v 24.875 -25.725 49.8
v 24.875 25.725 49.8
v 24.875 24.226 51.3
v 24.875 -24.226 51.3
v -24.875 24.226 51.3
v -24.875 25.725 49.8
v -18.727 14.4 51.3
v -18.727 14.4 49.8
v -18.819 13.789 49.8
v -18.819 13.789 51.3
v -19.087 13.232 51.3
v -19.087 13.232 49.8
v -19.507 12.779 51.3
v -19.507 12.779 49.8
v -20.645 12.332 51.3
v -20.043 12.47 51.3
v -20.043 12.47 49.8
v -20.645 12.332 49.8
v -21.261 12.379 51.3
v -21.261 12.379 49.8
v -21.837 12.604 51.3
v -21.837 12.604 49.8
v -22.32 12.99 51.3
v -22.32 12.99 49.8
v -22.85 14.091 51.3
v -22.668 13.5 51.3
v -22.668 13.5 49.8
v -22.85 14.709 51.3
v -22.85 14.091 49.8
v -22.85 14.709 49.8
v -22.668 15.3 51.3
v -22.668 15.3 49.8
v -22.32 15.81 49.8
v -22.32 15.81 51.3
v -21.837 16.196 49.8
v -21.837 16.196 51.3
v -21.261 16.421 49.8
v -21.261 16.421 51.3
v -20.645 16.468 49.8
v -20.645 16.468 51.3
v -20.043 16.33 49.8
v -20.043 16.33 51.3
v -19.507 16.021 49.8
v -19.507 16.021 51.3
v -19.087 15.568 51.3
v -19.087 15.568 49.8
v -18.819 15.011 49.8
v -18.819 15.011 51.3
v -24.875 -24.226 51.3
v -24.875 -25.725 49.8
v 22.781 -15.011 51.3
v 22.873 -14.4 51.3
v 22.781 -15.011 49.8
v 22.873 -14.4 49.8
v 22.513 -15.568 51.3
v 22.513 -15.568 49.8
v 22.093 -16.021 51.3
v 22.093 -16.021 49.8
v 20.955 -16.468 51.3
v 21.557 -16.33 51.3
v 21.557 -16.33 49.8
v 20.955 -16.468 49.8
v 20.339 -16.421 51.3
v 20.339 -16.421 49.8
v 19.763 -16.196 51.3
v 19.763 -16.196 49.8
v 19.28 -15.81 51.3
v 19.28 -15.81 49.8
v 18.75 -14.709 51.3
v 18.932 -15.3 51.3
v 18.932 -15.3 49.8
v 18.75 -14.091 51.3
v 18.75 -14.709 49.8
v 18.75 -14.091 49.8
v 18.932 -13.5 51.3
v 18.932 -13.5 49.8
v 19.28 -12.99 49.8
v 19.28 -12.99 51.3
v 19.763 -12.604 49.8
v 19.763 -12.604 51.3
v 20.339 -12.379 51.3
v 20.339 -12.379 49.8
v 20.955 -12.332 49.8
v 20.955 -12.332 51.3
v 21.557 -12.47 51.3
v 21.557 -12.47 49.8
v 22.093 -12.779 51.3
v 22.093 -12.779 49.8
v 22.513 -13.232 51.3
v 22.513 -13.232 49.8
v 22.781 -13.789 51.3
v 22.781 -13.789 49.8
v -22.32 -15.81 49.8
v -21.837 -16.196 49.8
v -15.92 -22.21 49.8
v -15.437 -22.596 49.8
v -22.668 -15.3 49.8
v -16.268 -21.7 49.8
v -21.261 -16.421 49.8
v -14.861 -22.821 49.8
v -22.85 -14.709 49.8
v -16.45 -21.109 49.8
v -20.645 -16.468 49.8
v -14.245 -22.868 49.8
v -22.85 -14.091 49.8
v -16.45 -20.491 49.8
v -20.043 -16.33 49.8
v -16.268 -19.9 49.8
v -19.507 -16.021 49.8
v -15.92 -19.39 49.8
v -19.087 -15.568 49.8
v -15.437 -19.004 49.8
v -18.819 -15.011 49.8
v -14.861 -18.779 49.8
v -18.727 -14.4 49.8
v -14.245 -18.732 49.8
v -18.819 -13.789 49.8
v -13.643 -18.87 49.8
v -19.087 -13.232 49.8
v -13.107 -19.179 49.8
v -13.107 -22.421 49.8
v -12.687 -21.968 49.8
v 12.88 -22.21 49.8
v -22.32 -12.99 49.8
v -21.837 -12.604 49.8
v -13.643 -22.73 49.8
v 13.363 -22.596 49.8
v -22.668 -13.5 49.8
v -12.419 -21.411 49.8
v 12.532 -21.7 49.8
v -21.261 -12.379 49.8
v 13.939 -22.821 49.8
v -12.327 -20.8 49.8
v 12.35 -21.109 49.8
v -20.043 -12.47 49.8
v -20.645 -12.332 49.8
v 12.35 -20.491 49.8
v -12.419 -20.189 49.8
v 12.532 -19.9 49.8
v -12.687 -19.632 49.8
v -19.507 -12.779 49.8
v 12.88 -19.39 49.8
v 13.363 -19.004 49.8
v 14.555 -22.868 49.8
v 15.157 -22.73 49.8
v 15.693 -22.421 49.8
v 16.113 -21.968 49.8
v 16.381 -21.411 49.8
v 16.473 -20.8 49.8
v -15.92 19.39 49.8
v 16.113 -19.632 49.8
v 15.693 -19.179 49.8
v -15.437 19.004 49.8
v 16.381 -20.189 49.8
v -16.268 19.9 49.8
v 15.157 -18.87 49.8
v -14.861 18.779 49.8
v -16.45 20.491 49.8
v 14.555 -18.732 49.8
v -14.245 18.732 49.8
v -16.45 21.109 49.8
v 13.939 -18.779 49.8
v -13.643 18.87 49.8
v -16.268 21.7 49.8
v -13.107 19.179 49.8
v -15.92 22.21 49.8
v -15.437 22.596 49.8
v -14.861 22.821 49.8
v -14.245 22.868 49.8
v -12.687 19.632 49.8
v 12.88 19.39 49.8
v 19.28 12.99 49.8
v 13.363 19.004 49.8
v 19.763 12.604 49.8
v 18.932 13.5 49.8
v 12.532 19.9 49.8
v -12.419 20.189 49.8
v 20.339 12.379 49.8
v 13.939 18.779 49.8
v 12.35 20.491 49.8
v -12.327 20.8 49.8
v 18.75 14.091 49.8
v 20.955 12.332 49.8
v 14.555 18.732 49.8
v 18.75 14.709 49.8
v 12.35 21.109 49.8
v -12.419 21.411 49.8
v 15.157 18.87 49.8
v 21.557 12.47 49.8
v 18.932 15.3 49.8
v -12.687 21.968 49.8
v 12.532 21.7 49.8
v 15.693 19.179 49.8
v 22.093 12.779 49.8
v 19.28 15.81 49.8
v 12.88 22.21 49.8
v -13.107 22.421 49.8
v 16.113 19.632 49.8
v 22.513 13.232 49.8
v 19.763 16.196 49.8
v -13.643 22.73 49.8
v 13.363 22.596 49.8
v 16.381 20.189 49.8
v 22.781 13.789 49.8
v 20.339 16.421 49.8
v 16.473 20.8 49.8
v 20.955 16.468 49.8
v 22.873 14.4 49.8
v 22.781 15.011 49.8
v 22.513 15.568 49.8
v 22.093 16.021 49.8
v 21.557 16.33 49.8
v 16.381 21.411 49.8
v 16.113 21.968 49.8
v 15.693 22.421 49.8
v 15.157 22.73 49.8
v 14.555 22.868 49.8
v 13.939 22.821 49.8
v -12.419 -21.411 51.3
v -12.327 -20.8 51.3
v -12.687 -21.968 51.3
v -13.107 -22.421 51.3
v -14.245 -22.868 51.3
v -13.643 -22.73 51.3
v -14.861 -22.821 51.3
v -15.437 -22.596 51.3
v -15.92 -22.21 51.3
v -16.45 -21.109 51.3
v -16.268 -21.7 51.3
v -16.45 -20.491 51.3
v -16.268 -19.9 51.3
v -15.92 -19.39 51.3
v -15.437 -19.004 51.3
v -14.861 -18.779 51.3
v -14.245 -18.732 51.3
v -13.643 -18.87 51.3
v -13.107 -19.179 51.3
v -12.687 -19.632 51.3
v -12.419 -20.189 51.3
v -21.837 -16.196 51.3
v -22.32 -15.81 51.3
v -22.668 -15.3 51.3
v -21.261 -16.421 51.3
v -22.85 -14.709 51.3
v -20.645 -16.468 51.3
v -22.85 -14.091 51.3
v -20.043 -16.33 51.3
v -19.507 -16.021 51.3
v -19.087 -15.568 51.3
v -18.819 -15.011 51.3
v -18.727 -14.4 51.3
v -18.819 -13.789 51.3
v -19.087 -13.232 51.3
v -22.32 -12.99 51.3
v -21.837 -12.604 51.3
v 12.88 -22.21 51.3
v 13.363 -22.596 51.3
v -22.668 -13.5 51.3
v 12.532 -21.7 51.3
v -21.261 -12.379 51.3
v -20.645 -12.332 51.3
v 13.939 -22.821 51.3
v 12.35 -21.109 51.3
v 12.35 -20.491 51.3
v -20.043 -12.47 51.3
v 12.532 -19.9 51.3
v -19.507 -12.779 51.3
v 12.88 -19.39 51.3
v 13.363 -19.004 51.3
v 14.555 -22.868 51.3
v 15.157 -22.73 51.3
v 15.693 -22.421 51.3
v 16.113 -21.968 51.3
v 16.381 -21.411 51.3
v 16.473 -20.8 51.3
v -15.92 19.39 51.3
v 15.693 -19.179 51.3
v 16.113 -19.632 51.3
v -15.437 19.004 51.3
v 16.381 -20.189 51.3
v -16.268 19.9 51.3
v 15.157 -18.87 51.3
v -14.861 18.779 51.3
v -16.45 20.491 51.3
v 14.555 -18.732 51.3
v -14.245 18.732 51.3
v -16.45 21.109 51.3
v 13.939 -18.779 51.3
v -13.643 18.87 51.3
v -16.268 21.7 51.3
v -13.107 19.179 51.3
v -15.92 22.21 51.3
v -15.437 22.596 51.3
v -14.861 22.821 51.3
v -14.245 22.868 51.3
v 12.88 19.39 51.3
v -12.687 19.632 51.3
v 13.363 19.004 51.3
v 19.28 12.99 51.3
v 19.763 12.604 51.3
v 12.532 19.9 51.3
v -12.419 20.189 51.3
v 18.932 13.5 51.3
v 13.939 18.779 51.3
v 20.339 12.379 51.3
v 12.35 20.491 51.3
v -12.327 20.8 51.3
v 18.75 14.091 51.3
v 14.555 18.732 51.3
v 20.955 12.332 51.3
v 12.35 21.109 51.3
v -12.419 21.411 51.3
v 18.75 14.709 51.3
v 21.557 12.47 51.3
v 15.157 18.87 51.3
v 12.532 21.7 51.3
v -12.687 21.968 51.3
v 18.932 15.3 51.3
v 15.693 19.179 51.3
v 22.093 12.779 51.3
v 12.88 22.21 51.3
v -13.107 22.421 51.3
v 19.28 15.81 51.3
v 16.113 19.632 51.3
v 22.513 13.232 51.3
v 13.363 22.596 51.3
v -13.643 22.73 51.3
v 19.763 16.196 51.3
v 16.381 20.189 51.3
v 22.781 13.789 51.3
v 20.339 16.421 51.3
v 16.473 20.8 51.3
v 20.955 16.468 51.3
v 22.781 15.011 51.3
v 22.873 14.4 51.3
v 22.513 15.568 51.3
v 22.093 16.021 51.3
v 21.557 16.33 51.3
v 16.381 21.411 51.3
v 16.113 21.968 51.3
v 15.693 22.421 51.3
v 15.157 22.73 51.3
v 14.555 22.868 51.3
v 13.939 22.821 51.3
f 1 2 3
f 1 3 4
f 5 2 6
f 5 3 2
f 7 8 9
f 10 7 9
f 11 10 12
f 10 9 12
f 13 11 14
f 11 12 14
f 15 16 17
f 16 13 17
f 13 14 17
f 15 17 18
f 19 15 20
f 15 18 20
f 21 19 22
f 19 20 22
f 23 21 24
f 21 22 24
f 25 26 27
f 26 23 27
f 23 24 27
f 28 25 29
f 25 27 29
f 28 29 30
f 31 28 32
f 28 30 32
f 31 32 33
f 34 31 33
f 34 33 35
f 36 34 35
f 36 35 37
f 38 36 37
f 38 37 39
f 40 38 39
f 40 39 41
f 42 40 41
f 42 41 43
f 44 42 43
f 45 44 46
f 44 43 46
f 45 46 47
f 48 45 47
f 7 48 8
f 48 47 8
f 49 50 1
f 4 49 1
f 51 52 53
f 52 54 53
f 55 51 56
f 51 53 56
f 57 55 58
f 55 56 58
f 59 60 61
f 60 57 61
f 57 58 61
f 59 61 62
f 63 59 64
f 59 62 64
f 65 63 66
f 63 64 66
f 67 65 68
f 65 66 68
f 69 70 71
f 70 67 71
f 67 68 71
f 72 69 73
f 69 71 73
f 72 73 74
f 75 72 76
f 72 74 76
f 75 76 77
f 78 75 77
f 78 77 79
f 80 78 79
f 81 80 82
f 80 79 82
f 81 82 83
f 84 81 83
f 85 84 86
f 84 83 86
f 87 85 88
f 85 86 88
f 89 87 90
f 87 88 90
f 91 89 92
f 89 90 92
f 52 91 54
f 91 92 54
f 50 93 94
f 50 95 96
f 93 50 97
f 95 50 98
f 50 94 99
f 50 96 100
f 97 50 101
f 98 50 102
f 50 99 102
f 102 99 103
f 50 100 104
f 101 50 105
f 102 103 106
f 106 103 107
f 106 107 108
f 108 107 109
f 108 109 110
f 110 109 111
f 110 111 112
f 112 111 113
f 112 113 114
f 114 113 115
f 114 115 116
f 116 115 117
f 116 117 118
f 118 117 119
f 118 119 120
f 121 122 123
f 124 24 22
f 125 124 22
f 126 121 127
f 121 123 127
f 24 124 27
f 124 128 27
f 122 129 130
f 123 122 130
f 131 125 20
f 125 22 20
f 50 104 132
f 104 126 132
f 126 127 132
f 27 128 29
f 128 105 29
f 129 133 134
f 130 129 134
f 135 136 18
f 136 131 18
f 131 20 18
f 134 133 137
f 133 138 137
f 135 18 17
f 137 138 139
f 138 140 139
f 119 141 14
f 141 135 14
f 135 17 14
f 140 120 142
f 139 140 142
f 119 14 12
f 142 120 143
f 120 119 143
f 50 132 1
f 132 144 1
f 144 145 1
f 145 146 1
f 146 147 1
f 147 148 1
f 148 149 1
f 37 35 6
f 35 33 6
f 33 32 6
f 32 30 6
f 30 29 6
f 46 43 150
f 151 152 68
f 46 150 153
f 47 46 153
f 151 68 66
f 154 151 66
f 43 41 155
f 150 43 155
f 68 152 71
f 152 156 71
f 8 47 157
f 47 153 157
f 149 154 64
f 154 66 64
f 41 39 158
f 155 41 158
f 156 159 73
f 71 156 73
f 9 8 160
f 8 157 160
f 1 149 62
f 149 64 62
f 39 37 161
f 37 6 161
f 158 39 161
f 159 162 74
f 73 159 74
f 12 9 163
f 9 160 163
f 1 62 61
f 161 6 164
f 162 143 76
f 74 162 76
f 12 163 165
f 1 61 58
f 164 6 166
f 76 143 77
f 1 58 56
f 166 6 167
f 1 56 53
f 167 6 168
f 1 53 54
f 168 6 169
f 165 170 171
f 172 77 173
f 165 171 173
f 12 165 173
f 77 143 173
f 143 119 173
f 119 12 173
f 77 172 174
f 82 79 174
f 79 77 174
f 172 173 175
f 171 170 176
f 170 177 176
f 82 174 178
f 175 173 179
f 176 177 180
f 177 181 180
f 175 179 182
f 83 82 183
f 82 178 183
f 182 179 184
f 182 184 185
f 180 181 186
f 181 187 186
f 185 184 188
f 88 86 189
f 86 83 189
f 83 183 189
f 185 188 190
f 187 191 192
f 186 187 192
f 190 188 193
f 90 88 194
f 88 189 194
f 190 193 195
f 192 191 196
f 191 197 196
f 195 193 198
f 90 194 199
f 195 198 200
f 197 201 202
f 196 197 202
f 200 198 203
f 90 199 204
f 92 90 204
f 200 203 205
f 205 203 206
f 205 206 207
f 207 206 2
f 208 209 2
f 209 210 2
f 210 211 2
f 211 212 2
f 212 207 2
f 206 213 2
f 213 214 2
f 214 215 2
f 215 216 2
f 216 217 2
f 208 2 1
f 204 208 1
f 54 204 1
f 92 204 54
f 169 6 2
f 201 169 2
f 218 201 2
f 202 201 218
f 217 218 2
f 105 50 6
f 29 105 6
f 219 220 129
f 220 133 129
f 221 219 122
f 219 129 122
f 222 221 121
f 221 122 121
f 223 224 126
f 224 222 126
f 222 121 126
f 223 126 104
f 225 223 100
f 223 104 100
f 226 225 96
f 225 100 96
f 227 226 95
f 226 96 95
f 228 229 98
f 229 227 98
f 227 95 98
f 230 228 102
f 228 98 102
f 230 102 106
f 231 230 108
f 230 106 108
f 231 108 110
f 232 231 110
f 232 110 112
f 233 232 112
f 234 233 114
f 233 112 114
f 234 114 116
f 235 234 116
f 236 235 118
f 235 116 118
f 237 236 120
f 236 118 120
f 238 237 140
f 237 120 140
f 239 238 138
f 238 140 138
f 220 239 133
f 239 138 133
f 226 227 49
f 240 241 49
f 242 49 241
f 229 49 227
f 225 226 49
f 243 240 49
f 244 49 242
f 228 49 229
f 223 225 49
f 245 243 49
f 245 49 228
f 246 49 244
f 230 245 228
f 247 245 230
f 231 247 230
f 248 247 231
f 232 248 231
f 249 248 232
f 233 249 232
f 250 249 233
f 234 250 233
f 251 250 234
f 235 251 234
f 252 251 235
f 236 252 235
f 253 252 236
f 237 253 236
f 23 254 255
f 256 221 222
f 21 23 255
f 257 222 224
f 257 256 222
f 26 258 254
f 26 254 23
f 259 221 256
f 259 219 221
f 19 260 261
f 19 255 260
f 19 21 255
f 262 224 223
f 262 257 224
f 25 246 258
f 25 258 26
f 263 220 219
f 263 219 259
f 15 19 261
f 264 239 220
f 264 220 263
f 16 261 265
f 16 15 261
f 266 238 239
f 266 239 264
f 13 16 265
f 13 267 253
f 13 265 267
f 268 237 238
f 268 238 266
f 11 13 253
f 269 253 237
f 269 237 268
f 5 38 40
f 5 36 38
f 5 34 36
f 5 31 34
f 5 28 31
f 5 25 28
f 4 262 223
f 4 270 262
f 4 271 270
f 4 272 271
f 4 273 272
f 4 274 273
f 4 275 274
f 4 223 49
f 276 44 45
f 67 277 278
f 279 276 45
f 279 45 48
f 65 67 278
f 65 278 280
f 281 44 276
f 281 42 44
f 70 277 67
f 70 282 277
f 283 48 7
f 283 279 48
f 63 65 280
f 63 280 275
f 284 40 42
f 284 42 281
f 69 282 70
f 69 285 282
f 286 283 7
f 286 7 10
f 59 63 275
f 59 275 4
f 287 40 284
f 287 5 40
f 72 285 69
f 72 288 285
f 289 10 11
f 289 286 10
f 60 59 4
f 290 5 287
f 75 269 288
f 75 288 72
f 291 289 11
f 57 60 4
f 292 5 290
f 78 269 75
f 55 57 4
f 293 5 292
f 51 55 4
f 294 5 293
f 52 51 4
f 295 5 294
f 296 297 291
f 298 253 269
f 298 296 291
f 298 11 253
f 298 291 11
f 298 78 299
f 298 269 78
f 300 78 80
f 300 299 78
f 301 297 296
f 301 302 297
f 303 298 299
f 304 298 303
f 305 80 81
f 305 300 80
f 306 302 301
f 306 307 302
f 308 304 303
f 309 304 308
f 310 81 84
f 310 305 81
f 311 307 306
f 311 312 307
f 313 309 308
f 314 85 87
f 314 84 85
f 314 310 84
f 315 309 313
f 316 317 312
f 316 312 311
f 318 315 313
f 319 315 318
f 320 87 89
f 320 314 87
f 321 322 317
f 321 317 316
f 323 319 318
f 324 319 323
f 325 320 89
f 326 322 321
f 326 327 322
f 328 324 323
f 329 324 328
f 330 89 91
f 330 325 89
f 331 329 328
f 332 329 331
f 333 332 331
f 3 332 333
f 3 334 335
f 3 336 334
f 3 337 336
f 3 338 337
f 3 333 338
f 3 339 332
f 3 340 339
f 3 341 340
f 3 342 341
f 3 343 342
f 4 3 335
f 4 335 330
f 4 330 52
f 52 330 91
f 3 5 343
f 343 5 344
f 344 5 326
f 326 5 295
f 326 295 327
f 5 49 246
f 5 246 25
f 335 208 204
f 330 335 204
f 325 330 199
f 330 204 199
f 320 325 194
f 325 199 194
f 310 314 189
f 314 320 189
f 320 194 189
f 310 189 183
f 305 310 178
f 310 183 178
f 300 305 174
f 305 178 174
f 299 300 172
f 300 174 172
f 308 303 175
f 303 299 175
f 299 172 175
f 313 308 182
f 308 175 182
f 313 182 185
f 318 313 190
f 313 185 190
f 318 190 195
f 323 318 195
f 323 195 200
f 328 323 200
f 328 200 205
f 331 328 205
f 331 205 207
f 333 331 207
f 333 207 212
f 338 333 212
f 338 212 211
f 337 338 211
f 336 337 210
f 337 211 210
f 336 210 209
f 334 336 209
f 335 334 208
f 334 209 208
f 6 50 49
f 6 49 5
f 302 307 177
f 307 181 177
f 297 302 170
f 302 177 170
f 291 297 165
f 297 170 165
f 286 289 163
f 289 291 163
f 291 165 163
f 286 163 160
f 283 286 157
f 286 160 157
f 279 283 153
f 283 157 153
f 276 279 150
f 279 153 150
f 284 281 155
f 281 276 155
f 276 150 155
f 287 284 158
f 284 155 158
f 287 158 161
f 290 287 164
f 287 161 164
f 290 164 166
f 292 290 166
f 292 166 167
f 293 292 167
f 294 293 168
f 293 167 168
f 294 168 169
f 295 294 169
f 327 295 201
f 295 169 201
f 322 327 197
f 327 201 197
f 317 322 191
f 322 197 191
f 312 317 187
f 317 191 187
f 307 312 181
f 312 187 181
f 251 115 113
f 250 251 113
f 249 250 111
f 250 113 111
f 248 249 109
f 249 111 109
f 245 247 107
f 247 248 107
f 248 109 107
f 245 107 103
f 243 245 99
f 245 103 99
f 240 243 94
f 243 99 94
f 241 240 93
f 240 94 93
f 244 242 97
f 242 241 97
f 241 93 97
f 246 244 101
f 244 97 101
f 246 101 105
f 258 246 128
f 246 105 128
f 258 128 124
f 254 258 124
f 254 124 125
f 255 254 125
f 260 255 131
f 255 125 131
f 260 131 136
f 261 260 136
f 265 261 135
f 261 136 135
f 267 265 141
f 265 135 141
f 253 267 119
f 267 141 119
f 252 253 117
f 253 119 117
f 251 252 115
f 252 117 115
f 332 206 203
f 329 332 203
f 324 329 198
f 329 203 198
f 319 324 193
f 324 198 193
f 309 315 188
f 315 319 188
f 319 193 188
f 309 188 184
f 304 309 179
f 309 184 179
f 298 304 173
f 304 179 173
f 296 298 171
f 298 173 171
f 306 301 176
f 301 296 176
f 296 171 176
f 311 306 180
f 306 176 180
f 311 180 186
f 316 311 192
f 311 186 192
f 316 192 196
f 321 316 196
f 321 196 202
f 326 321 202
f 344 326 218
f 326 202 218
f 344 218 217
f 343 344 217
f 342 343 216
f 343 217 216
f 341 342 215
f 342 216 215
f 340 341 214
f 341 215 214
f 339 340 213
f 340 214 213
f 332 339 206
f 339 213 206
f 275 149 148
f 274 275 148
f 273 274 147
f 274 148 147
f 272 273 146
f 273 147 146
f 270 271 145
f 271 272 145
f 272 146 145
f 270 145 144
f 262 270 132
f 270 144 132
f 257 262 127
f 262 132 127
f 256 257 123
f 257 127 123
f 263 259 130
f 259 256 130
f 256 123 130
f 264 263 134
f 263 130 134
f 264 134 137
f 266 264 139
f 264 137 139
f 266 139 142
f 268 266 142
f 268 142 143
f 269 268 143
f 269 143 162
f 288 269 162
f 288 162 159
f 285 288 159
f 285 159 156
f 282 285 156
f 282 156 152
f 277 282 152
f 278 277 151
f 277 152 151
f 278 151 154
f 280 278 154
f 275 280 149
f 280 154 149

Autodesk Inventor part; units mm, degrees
ref_plane "YZ Plane" through (0, 0, 0) normal (1, 0, 0) x (0, 1, 0)
ref_plane "XZ Plane" through (0, 0, 0) normal (0, 1, 0) x (-1, 0, 0)
sketch "Sketch1" plane through (0, 0, 0) normal (0, 0, 1) x (1, 0, 0)
  circle A0 centre (-21.9, -21.9) radius 1.875 projected
  circle A1 centre (21.9, 21.9) radius 1.875 projected
  circle A2 centre (21.9, -21.9) radius 1.875 projected
  circle A3 centre (-21.9, 21.9) radius 1.875 projected
  circle A4 centre (14.4, 20.8) radius 2.0734 projected
  circle A5 centre (-14.4, -20.8) radius 2.0734 projected
  circle A6 centre (14.4, -20.8) radius 2.0734 projected
  circle A7 centre (20.8, -14.4) radius 2.0734 projected
  line L0 (-17.05, 17.05) -> (-17.05, -17.05) projected
  line L1 (17.05, 17.05) -> (-17.05, 17.05) projected
  line L2 (17.05, -17.05) -> (17.05, 17.05) projected
  line L3 (-17.05, -17.05) -> (17.05, -17.05) projected
  circle A8 centre (20.8, 14.4) radius 2.0734 projected
  circle A9 centre (-14.4, 20.8) radius 2.0734 projected
  circle A10 centre (-20.8, -14.4) radius 2.0734 projected
  circle A11 centre (-20.8, 14.4) radius 2.0734 projected
  line L4 (-22.9, 24.875) -> (22.9, 24.875) projected
  arc A12 (-22.9, 24.875) -> (-24.875, 22.9) centre (-22.9, 22.9) ccw projected
  line L5 (-24.875, -22.9) -> (-24.875, 22.9) projected
  arc A13 (-24.875, -22.9) -> (-22.9, -24.875) centre (-22.9, -22.9) ccw projected
  line L6 (22.9, -24.875) -> (-22.9, -24.875) projected
  arc A14 (22.9, -24.875) -> (24.875, -22.9) centre (22.9, -22.9) ccw projected
  line L7 (24.875, 22.9) -> (24.875, -22.9) projected
  arc A15 (24.875, 22.9) -> (22.9, 24.875) centre (22.9, 22.9) ccw projected
  point P0 (0, 0)
ref_plane "Work Plane1" through (-24.15, -24.15, 49.8) normal (0, 0, 1) x (1, 0, 0)
extrude "Extrusion1" add sketch "Sketch1" along normal blind 1.5 from surface at 49.8 contours A0 | A1 | A2 | A3 | L1 L2 L3 L0 | L4 A15 L7 A14 L6 A13 L5 A12
sketch "Sketch2" plane through (-22.9, -24.875, 51.3) normal (0, 0, 1) x (1, 0, 0)
  arc A0 (-1.975, 1.975) -> (0, 0) centre (0, 1.975) ccw projected
  line L0 (45.8, 0) -> (0, 0) projected
  arc A1 (45.8, 0) -> (47.775, 1.975) centre (45.8, 1.975) ccw projected
  line L1 (47.775, 47.775) -> (47.775, 1.975) projected
  arc A2 (47.775, 47.775) -> (45.8, 49.75) centre (45.8, 47.775) ccw projected
  line L2 (0, 49.75) -> (45.8, 49.75) projected
  arc A3 (0, 49.75) -> (-1.975, 47.775) centre (0, 47.775) ccw projected
  line L3 (-1.975, 1.975) -> (-1.975, 47.775) projected
  circle A4 centre (2.1, 39.275) radius 2.0734 projected
  circle A5 centre (2.1, 10.475) radius 2.0734 projected
  circle A6 centre (8.5, 45.675) radius 2.0734 projected
  circle A7 centre (43.7, 39.275) radius 2.0734 projected
  circle A8 centre (43.7, 10.475) radius 2.0734 projected
  circle A9 centre (37.3, 4.075) radius 2.0734 projected
  circle A10 centre (8.5, 4.075) radius 2.0734 projected
  circle A11 centre (37.3, 45.675) radius 2.0734 projected
  arc A12 (48.625, 47.775) -> (45.8, 50.6) centre (45.8, 47.775) ccw
  line L4 (48.625, 47.775) -> (48.625, 1.975)
  arc A13 (45.8, -0.85) -> (48.625, 1.975) centre (45.8, 1.975) ccw
  line L5 (45.8, -0.85) -> (0, -0.85)
  arc A14 (-2.825, 1.975) -> (0, -0.85) centre (0, 1.975) ccw
  line L6 (-2.825, 1.975) -> (-2.825, 47.775)
  arc A15 (0, 50.6) -> (-2.825, 47.775) centre (0, 47.775) ccw
  line L7 (0, 50.6) -> (45.8, 50.6)
  line L8 (47.775, 1.975) -> (45.8, 1.975)
  line L9 (45.8, 1.975) -> (45.8, -0.85)
  line L10 (45.8, -0.85) -> (47.775, -0.85)
  line L11 (47.775, -0.85) -> (47.775, 1.975)
  line L12 (-1.975, 1.975) -> (0, 1.975)
  line L13 (0, 1.975) -> (0, -0.85)
  line L14 (0, -0.85) -> (-1.975, -0.85)
  line L15 (-1.975, -0.85) -> (-1.975, 1.975)
  line L16 (-1.975, 47.775) -> (0, 47.775)
  line L17 (0, 47.775) -> (0, 50.6)
  line L18 (0, 50.6) -> (-1.975, 50.6)
  line L19 (-1.975, 50.6) -> (-1.975, 47.775)
  line L20 (47.775, 47.775) -> (45.8, 47.775)
  line L21 (45.8, 47.775) -> (45.8, 50.6)
  line L22 (45.8, 50.6) -> (47.775, 50.6)
  line L23 (47.775, 50.6) -> (47.775, 47.775)
  point P0 (22.9, 24.875)
  dimension "d2" = 0.85
extrude "Extrusion2" add sketch "Sketch2" against normal blind 1.5 contours A0 L13 A14 L15 | L0 L9 L5 L13 | L19 A15 L17 A3 | A14 L14 L15 | A1 L11 A13 L9 | L17 L7 L21 L2 | L19 L18 A15 | A13 L11 L10 | L21 A12 L23 A2 | L22 L23 A12
chamfer "Chamfer1" distance 1.5 angle 45 2 edges at (0, 25.725, 51.3) (0, -25.725, 51.3)
properties part number "Panel Top 1x1"
